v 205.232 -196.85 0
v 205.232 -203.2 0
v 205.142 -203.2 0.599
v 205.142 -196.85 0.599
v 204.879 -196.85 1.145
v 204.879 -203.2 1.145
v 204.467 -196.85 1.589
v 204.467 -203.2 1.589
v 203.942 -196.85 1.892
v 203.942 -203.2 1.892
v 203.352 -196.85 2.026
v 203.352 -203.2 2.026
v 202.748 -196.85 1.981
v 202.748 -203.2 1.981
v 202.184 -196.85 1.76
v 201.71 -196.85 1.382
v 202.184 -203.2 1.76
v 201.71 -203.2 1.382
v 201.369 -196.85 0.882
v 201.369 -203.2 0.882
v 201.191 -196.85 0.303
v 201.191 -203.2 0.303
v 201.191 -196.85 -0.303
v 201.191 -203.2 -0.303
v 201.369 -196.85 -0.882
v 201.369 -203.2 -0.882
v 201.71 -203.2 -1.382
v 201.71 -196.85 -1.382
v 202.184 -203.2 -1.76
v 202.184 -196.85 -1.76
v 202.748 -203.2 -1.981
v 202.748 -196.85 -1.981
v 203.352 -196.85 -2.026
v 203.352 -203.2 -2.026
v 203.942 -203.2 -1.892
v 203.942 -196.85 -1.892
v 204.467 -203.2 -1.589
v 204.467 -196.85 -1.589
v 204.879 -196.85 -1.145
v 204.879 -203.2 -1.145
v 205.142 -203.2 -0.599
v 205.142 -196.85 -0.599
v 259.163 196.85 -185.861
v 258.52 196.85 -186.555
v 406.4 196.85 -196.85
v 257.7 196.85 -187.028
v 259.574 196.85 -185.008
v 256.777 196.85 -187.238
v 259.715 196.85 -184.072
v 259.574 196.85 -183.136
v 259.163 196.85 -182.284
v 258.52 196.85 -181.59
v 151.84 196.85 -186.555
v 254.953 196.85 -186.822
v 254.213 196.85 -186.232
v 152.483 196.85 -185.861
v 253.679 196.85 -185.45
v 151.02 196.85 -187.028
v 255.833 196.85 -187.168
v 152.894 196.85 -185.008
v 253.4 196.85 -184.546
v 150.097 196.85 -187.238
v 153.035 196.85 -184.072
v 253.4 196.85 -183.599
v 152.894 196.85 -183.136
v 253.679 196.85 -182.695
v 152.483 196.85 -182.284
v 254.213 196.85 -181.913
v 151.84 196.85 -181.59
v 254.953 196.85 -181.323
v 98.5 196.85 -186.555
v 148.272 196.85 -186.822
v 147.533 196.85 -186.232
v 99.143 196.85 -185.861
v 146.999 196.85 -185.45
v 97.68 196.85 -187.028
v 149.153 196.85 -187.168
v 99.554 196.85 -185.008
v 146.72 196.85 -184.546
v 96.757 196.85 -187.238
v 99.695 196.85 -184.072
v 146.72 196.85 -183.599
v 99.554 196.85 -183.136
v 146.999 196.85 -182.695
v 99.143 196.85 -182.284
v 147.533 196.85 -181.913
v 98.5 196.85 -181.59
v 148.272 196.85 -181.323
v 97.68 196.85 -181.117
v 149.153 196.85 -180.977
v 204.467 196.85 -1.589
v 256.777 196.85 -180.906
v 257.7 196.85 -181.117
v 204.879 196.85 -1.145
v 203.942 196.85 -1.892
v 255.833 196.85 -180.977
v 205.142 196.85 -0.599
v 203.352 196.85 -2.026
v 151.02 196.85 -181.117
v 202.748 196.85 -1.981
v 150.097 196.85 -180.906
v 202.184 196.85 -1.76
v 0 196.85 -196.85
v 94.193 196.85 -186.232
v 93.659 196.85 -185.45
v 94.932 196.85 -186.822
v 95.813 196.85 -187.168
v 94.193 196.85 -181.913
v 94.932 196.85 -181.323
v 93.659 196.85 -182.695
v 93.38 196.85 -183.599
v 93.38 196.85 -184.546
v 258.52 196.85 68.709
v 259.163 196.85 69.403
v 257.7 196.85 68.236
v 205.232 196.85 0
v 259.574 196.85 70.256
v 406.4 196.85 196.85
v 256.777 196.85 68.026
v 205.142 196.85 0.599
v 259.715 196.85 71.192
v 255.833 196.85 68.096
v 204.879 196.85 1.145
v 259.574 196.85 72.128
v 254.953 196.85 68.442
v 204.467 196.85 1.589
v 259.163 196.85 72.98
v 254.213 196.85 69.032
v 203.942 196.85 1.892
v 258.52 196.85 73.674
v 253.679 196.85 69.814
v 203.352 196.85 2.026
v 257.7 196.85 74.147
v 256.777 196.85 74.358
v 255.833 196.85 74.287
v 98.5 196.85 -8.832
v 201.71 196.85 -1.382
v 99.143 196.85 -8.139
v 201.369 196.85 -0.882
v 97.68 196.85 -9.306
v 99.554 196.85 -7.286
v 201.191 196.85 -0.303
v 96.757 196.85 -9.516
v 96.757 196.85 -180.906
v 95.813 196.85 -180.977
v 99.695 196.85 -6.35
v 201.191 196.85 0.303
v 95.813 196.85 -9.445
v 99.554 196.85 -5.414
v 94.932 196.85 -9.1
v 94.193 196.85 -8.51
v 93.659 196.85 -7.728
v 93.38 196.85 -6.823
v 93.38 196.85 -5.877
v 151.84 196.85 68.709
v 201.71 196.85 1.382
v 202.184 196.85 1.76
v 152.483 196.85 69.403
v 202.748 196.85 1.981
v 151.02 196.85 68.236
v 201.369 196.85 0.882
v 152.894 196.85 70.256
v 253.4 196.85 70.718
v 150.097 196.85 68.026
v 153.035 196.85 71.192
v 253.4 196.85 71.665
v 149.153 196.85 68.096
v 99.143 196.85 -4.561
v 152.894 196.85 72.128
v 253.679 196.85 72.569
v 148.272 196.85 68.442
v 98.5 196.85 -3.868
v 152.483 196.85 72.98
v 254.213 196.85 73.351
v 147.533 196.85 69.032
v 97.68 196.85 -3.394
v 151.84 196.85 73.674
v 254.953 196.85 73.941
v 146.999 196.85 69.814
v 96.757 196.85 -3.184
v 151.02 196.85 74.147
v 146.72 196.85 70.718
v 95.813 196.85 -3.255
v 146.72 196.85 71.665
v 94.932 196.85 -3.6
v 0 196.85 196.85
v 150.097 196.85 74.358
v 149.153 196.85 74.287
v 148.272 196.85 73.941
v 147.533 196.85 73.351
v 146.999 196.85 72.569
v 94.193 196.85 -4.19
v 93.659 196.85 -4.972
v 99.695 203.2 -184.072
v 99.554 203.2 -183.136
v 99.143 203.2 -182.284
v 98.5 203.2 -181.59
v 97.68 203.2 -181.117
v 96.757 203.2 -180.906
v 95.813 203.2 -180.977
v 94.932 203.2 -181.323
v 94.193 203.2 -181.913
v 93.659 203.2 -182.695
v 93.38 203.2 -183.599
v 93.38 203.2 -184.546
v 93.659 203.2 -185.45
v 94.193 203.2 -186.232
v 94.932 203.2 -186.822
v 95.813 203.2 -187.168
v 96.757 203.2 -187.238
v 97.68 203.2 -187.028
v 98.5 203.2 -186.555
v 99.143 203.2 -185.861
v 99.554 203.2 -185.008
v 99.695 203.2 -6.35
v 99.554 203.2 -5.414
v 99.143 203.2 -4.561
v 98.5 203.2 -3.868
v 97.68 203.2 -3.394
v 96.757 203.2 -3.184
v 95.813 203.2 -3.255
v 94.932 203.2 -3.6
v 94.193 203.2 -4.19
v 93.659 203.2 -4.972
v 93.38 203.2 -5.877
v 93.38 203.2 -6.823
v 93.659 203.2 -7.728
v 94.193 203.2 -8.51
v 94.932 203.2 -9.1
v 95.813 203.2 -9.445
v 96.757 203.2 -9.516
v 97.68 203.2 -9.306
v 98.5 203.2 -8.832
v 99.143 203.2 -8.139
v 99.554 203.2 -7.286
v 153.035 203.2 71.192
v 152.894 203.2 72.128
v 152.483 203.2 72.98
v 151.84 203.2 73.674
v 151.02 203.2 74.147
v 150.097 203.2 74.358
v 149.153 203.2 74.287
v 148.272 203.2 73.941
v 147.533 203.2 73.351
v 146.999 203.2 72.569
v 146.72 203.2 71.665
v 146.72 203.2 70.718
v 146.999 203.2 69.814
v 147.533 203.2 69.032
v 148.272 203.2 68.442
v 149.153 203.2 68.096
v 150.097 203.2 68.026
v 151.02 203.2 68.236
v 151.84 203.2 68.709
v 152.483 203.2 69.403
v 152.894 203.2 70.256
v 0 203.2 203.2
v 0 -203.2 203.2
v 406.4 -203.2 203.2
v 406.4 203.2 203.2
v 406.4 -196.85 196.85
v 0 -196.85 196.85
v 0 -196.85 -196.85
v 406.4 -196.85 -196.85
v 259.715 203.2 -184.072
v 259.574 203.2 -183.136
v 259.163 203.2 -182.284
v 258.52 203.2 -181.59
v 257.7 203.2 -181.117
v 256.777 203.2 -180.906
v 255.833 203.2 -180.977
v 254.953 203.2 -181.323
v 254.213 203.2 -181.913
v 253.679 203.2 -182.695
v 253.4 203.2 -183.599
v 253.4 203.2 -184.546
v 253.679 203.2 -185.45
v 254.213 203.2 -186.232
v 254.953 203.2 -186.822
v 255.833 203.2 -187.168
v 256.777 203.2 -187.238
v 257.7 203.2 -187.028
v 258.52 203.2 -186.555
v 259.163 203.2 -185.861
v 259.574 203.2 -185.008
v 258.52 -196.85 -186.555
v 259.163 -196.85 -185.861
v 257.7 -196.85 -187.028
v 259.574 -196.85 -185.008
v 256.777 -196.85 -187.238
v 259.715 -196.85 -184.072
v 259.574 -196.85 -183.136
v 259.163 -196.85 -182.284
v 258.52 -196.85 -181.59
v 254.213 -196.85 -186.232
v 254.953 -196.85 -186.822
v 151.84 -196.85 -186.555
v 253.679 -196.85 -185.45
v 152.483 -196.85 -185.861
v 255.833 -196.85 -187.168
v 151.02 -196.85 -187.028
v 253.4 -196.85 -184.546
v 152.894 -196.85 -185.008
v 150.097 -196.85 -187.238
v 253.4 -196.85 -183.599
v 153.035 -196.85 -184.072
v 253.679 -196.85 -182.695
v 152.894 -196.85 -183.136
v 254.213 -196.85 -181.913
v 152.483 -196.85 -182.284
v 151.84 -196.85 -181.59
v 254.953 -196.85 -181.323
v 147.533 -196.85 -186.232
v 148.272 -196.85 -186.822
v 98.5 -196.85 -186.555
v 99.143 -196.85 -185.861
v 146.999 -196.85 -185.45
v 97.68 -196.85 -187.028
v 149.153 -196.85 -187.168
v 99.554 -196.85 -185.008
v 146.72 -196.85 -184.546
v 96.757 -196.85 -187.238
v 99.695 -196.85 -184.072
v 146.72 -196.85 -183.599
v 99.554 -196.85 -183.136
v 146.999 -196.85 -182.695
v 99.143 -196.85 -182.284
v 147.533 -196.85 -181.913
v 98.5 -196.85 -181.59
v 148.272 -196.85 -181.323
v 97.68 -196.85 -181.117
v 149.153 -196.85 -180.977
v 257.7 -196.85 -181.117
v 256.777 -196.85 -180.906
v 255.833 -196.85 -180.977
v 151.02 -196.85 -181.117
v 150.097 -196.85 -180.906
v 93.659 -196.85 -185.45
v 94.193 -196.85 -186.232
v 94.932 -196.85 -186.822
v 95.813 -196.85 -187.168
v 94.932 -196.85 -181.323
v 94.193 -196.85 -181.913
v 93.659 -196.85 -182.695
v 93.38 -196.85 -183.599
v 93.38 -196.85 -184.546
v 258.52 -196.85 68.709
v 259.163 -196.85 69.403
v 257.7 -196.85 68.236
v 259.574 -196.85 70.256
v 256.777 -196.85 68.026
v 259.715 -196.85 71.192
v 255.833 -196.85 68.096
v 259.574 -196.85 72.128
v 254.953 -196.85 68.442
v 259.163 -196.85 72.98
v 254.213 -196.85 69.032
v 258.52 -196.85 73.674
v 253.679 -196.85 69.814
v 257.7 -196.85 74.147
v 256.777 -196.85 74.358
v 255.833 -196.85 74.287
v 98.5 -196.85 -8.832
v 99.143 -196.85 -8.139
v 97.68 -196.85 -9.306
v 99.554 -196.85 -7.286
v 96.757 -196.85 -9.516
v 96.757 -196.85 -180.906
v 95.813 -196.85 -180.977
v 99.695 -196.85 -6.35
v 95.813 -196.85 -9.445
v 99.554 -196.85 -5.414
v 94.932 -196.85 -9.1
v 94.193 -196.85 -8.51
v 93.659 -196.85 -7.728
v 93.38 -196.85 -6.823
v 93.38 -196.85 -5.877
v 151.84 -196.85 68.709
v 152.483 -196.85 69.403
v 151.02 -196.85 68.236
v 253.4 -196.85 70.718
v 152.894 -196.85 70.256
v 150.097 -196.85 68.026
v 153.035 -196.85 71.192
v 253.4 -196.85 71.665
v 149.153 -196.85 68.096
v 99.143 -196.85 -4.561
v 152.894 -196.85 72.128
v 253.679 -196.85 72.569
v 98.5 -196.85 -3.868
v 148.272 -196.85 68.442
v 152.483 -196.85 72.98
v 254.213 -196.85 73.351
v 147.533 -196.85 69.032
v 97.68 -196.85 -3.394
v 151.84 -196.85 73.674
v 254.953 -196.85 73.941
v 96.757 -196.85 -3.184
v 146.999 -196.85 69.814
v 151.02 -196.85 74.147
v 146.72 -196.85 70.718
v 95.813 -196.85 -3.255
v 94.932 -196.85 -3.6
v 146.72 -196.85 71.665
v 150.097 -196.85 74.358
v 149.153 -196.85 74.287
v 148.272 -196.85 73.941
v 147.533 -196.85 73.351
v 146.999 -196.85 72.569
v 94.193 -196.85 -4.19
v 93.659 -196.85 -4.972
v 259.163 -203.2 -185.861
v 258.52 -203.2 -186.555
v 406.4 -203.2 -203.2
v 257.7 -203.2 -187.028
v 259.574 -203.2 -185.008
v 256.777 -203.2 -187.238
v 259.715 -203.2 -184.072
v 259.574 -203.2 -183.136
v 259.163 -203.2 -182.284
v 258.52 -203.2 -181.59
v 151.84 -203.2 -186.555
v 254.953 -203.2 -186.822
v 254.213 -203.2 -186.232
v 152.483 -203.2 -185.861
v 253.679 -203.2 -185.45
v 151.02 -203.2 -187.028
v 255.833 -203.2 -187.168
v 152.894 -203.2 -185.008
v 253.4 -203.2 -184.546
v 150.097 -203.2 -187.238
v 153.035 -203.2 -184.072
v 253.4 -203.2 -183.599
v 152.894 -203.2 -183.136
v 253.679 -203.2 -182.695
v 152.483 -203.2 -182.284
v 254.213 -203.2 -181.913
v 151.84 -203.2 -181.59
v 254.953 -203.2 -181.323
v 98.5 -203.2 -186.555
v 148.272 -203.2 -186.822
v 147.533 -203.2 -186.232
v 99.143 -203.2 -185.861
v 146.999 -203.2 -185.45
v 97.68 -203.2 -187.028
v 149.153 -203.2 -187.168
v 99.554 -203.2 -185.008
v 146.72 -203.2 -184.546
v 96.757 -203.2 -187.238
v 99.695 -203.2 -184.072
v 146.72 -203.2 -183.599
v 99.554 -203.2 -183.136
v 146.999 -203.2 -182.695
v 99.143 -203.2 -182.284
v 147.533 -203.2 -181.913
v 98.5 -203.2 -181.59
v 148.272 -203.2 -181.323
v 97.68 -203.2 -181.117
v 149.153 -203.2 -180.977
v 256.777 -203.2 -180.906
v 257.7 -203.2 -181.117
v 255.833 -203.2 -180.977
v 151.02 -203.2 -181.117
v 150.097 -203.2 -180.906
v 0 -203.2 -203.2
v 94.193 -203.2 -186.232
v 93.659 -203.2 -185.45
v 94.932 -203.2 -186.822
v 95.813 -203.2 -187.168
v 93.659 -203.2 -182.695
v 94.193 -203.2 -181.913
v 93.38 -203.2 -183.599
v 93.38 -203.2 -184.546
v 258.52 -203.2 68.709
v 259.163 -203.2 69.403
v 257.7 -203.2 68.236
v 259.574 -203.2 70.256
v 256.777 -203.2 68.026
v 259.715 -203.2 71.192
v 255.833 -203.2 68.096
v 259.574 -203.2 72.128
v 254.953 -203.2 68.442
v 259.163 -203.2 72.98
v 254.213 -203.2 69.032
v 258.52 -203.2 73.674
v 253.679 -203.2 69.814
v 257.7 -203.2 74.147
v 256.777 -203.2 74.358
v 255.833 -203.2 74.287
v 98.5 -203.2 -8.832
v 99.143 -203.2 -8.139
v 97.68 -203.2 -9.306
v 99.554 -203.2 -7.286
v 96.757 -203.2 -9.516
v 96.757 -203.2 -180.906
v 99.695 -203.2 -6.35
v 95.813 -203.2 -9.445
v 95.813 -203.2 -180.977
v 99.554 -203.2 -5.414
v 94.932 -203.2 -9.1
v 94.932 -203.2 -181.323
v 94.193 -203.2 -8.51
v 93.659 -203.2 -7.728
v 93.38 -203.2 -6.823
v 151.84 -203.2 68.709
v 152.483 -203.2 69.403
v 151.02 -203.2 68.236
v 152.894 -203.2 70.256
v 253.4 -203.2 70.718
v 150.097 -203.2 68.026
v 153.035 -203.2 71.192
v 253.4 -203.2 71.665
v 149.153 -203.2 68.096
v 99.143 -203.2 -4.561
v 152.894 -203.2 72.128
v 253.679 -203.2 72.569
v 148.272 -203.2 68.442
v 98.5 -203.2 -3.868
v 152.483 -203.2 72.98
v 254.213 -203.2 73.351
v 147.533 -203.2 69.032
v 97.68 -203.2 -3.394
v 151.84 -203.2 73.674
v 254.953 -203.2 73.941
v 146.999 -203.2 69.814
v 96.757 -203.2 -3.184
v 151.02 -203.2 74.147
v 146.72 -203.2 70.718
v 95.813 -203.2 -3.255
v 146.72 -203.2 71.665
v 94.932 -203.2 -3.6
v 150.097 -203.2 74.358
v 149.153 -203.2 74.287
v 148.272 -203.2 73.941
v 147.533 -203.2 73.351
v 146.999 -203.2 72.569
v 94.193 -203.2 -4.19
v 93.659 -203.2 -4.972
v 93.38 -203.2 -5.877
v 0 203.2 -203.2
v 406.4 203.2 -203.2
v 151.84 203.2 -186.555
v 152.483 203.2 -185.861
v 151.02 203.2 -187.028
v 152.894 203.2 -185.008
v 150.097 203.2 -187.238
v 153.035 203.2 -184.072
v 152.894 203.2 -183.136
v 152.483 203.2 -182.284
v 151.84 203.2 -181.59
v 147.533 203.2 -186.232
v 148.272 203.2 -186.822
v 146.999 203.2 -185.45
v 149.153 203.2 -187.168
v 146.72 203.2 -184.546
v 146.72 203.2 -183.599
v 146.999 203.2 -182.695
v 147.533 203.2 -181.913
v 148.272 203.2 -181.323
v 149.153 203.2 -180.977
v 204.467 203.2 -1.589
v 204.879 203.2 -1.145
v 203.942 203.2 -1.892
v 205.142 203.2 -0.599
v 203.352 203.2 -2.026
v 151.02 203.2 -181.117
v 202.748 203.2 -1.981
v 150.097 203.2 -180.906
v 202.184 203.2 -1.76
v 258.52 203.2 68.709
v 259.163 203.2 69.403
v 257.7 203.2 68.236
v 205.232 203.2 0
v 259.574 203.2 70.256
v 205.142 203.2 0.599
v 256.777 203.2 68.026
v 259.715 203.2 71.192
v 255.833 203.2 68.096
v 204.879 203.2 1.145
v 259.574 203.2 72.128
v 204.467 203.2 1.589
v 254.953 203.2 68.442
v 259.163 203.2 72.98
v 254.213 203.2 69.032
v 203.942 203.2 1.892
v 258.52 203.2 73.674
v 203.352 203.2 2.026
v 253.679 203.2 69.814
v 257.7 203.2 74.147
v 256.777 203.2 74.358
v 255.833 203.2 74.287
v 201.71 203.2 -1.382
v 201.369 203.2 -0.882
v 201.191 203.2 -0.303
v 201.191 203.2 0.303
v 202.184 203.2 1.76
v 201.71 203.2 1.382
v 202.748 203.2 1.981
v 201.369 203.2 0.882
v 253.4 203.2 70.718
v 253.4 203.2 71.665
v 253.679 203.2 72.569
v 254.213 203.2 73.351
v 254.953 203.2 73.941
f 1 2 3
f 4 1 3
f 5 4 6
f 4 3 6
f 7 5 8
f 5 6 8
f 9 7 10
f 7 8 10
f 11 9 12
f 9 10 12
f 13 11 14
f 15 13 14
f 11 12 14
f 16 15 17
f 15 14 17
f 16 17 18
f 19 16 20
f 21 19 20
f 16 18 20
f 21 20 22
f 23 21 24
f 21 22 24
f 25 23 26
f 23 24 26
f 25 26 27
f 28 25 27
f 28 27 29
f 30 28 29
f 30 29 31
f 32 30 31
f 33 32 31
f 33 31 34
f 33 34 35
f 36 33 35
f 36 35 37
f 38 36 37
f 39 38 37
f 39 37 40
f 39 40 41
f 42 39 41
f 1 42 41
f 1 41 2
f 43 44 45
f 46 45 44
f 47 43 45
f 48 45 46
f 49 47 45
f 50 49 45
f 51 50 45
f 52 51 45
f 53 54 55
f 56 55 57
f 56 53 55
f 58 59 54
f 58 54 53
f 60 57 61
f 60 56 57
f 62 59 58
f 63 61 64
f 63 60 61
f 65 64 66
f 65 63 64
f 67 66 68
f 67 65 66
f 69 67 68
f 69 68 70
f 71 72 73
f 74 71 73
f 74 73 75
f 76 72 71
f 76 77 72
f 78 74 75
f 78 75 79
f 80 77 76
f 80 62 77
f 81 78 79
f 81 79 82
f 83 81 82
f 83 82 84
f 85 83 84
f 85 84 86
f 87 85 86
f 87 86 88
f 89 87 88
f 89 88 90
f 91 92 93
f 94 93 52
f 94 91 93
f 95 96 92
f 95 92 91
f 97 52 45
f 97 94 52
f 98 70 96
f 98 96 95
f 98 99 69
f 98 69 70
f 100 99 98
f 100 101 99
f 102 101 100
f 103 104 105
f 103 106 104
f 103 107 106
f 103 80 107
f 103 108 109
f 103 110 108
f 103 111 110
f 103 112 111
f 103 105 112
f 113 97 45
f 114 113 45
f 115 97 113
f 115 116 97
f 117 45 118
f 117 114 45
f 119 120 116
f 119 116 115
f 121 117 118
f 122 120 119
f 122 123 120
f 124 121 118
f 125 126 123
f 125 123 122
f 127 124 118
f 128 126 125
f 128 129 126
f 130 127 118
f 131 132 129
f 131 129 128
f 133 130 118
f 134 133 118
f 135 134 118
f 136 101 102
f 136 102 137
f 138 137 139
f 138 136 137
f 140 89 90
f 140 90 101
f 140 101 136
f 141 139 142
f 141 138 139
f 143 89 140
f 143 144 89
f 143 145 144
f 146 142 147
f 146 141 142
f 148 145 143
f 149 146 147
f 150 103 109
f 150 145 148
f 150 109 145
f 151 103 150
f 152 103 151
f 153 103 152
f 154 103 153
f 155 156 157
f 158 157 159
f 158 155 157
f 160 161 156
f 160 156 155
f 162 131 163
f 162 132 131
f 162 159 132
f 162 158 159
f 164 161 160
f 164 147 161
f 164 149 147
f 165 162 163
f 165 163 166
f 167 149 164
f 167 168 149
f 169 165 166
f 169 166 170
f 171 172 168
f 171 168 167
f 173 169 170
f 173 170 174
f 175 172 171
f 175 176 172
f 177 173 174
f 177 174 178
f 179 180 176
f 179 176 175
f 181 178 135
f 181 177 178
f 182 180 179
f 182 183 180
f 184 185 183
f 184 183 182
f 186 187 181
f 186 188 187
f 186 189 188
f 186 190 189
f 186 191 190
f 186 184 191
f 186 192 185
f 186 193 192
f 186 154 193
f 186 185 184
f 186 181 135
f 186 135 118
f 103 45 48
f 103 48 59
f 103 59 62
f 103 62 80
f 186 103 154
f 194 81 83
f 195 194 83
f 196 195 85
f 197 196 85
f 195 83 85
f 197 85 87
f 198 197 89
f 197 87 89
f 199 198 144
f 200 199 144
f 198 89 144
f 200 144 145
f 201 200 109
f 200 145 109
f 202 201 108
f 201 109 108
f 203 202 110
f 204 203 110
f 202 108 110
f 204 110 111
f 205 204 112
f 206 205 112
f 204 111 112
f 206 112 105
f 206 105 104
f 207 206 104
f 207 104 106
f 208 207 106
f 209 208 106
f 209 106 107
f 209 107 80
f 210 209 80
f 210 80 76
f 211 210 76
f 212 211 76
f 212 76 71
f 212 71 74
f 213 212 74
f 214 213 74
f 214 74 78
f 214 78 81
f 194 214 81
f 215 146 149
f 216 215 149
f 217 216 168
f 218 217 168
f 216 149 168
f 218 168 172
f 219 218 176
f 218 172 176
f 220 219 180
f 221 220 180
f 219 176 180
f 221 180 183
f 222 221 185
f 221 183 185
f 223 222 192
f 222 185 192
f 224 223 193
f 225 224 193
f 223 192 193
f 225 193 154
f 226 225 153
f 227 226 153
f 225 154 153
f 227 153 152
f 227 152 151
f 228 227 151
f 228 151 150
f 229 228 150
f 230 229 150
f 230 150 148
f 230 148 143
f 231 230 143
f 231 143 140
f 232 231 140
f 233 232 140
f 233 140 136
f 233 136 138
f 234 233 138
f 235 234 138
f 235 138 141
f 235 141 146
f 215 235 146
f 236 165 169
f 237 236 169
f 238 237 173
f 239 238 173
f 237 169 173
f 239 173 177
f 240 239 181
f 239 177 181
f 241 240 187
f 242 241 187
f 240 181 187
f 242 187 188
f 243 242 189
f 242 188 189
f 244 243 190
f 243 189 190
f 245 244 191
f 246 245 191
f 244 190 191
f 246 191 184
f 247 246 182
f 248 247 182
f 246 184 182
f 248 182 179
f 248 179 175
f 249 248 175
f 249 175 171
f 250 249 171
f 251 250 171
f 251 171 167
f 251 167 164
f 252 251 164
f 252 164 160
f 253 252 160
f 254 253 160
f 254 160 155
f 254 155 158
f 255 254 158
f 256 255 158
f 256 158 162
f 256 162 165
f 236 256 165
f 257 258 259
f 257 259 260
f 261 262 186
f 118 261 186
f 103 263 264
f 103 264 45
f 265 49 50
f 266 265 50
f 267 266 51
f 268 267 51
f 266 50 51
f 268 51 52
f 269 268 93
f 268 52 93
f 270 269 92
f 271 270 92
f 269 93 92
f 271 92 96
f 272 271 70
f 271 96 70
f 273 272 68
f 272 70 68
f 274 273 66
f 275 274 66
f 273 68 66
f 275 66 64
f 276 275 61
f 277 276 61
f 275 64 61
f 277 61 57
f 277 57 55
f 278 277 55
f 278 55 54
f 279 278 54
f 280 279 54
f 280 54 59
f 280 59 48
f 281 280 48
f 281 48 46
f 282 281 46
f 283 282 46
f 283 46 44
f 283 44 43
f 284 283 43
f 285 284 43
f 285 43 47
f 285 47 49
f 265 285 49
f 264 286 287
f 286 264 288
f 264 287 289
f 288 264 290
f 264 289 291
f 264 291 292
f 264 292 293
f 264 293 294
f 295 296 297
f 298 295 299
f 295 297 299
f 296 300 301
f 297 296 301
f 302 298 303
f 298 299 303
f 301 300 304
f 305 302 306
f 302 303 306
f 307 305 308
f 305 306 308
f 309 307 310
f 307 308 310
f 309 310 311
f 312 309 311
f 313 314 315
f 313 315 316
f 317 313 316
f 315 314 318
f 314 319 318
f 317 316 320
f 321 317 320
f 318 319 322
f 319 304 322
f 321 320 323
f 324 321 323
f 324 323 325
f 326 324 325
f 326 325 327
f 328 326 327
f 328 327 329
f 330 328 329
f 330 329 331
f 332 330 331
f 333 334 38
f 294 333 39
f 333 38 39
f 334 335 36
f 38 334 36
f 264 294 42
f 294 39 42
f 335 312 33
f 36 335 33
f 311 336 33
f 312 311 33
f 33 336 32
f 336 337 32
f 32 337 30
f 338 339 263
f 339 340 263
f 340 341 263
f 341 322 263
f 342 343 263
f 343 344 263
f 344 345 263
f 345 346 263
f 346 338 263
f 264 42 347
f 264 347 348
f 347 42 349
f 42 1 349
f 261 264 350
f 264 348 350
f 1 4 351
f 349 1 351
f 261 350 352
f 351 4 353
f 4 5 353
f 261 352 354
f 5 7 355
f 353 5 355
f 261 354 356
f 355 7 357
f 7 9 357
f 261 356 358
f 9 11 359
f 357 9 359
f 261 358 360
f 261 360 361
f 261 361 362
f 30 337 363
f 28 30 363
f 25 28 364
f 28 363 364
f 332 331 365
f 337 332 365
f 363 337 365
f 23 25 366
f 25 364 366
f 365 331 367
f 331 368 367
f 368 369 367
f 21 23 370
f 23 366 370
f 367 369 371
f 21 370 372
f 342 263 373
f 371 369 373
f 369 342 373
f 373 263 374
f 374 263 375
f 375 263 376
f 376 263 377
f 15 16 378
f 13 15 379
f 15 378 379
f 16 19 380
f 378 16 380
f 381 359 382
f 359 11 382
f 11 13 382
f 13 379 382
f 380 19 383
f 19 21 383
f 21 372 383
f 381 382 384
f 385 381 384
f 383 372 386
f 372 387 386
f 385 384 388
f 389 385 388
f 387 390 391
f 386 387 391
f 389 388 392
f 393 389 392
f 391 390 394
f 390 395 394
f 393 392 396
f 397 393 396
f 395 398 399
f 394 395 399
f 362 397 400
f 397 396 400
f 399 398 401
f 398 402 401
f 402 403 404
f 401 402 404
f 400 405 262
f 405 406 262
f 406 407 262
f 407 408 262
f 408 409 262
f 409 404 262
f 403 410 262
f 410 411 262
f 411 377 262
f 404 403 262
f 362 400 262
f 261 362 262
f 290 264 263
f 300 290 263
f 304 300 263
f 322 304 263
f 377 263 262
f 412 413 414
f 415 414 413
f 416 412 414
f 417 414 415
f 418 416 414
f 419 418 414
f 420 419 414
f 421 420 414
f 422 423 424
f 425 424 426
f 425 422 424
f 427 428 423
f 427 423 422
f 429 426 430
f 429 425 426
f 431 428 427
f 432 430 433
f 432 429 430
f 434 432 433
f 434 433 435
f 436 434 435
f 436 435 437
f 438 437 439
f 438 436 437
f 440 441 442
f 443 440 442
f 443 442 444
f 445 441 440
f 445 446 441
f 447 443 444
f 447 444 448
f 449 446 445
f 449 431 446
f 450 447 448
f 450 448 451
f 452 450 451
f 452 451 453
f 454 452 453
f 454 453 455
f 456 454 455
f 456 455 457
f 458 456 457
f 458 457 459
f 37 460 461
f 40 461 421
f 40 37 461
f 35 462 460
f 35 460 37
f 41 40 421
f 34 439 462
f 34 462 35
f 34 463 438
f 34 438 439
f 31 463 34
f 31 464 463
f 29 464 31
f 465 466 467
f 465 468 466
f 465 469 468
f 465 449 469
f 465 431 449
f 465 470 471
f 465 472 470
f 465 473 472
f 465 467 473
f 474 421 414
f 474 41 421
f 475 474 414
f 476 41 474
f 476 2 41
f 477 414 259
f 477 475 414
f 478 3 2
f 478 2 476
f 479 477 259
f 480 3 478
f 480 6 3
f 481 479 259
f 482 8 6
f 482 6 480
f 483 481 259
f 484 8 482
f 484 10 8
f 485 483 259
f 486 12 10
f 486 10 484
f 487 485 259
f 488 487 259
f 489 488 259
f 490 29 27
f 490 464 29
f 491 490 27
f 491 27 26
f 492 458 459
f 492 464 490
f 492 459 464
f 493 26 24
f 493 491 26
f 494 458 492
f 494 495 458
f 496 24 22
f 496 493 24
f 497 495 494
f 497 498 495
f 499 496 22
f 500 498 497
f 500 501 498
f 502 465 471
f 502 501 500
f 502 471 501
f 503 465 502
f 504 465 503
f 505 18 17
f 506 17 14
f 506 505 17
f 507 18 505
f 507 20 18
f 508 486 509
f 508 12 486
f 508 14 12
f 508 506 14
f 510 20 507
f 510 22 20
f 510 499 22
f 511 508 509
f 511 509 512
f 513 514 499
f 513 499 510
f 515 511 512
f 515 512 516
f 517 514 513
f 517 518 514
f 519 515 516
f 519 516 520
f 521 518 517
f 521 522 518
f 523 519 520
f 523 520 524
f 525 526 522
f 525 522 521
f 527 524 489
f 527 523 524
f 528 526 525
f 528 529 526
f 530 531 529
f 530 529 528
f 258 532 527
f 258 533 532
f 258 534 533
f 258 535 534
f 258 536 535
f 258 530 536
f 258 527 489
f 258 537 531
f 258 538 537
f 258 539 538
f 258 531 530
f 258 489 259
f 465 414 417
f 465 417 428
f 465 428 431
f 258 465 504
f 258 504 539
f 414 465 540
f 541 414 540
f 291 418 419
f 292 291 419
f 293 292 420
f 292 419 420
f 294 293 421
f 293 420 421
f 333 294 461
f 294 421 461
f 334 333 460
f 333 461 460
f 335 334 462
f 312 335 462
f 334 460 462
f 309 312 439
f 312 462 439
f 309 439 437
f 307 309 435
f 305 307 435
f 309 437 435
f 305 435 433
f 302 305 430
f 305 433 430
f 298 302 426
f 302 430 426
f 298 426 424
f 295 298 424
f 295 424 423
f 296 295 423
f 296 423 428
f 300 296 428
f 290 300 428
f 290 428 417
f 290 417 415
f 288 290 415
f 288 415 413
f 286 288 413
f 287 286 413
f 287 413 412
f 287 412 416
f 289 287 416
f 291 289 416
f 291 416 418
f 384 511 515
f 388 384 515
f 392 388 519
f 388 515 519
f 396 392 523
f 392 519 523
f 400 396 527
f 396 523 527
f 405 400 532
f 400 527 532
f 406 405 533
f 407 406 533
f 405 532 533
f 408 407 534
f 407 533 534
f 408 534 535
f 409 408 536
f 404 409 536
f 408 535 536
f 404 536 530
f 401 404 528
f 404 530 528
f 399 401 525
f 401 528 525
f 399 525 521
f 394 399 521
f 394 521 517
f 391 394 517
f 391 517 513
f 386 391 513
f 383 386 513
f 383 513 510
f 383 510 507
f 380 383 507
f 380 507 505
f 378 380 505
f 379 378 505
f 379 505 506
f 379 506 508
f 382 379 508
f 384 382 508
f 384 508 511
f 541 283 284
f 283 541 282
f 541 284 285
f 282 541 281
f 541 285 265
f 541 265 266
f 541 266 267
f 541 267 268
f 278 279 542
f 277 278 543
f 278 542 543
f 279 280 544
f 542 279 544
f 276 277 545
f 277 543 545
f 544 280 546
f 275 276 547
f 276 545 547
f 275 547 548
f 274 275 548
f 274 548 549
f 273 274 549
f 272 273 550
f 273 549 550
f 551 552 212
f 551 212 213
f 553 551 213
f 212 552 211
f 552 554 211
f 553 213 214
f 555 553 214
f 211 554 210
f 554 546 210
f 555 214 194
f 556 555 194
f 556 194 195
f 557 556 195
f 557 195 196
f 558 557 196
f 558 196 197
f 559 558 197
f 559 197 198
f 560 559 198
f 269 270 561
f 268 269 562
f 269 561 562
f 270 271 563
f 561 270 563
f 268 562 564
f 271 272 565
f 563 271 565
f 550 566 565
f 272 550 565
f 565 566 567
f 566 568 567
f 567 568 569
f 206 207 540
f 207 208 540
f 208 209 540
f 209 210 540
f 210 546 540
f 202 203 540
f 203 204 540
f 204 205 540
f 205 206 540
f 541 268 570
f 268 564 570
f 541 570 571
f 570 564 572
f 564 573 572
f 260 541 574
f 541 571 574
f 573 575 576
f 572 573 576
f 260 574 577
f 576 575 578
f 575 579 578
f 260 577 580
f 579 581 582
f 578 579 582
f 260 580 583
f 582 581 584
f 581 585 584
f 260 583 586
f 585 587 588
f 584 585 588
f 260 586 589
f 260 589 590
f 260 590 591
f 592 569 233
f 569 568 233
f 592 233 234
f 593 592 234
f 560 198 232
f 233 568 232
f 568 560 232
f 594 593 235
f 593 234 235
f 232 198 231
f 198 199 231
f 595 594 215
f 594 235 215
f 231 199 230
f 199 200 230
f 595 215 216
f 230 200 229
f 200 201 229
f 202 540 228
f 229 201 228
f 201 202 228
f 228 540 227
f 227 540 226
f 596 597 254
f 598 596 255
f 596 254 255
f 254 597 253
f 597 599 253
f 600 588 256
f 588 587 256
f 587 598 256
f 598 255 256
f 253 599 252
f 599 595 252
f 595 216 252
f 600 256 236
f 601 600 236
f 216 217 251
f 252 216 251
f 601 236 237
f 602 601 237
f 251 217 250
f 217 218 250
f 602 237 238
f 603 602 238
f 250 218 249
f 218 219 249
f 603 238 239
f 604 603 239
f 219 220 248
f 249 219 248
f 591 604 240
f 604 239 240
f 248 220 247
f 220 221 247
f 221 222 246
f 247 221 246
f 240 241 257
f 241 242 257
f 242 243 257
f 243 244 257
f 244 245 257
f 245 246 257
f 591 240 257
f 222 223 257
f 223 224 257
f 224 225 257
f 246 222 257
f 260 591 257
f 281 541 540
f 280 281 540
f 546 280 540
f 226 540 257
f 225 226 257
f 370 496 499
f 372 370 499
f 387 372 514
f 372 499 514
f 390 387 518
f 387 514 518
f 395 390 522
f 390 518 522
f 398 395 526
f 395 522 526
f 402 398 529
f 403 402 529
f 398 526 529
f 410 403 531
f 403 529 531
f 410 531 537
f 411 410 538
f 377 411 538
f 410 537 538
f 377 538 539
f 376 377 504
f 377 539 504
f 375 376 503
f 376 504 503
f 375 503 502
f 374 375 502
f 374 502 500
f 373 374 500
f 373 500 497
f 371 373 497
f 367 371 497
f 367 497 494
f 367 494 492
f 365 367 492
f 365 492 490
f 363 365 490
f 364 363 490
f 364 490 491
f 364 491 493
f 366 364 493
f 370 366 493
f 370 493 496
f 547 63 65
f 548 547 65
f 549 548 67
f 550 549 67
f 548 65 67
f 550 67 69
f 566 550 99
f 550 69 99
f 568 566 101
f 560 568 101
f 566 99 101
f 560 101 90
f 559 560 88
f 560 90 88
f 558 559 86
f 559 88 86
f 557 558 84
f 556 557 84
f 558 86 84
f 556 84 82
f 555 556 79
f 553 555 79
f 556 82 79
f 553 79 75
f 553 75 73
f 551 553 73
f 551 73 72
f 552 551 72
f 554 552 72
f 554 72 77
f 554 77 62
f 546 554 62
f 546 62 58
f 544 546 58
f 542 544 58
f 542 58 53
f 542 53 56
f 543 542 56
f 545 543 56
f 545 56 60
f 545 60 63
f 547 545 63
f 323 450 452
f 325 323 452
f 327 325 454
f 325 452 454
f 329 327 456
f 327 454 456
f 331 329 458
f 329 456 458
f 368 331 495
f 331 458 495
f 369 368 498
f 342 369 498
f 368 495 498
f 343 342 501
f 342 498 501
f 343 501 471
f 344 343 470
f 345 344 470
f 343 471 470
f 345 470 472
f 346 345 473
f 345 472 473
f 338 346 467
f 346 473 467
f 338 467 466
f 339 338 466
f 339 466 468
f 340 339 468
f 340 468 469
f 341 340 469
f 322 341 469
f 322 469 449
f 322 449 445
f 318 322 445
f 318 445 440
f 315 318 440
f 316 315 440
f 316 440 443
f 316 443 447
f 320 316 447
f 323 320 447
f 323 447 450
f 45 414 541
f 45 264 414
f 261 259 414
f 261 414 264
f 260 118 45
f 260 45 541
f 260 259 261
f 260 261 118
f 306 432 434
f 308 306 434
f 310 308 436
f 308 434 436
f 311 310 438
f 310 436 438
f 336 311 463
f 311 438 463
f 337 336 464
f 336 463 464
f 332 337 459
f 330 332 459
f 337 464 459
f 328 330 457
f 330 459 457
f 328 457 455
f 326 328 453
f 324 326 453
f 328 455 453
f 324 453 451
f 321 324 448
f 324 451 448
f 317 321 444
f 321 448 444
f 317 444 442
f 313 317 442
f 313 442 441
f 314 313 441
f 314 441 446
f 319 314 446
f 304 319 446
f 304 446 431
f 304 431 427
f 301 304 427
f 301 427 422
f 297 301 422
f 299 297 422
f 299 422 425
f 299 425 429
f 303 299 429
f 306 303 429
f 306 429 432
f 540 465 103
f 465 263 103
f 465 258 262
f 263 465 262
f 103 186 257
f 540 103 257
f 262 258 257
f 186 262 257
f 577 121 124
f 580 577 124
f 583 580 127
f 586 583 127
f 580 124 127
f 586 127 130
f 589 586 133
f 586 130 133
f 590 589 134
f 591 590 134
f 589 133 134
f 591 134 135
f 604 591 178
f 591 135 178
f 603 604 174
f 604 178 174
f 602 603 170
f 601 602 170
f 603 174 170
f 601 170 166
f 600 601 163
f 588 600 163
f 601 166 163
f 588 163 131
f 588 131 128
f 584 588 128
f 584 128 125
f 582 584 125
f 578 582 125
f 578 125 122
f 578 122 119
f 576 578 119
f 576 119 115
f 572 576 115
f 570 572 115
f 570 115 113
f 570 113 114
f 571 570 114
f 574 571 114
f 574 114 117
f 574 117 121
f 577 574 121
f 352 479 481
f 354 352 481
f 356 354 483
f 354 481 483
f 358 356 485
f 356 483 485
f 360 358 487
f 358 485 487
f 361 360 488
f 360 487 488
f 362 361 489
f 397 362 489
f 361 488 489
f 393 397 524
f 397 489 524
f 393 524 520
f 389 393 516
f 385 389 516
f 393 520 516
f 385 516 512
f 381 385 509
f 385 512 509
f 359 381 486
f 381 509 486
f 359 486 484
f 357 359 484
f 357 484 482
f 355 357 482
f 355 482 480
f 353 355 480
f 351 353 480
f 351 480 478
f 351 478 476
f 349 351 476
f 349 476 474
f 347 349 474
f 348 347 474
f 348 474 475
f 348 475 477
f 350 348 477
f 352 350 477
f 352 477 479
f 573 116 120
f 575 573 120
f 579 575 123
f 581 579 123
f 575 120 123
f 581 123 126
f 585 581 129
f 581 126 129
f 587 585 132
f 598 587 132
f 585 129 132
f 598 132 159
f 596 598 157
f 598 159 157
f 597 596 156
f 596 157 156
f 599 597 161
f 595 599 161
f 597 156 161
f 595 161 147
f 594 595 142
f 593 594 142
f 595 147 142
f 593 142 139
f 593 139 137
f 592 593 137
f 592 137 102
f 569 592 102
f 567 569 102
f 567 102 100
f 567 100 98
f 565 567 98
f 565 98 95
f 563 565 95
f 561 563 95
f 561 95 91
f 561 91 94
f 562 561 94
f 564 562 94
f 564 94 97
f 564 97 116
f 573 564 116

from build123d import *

# Parameters (mm, degrees)
F0_W     = 406.4
F0_H     = 406.4
F0_W_2   = 393.7
F0_H_2   = 393.7
F1_DEPTH = 406.4
F2_W     = 406.4
F2_H     = 406.4
F2_R     = 3.175
F2_R_2   = 2.032
F3_DEPTH = 406.4


with BuildPart() as f1:
    # F0 (on Right) → F1 (new body)
    with BuildSketch(Plane.YZ):
        Rectangle(F0_W, F0_H)
        Rectangle(F0_W_2, F0_H_2, mode=Mode.SUBTRACT)
    extrude(amount=F1_DEPTH)

    # F2 (on face) → F3 (intersect)
    with BuildSketch(Plane.XZ.offset(203.2)):
        with Locations((203.2, 0)):
            Rectangle(F2_W, F2_H)
        with Locations((96.52, -184.072345)):
            Circle(F2_R, mode=Mode.SUBTRACT)
        with Locations((149.86, -184.072345)):
            Circle(F2_R, mode=Mode.SUBTRACT)
        with Locations((96.52, -6.35)):
            Circle(F2_R, mode=Mode.SUBTRACT)
        with Locations((256.54, -184.072345)):
            Circle(F2_R, mode=Mode.SUBTRACT)
        with Locations((203.2, 0)):
            Circle(F2_R_2, mode=Mode.SUBTRACT)
        with Locations((149.86, 71.191654)):
            Circle(F2_R, mode=Mode.SUBTRACT)
        with Locations((256.54, 71.191654)):
            Circle(F2_R, mode=Mode.SUBTRACT)
    extrude(amount=-F3_DEPTH, mode=Mode.INTERSECT)


solid = f1.part
